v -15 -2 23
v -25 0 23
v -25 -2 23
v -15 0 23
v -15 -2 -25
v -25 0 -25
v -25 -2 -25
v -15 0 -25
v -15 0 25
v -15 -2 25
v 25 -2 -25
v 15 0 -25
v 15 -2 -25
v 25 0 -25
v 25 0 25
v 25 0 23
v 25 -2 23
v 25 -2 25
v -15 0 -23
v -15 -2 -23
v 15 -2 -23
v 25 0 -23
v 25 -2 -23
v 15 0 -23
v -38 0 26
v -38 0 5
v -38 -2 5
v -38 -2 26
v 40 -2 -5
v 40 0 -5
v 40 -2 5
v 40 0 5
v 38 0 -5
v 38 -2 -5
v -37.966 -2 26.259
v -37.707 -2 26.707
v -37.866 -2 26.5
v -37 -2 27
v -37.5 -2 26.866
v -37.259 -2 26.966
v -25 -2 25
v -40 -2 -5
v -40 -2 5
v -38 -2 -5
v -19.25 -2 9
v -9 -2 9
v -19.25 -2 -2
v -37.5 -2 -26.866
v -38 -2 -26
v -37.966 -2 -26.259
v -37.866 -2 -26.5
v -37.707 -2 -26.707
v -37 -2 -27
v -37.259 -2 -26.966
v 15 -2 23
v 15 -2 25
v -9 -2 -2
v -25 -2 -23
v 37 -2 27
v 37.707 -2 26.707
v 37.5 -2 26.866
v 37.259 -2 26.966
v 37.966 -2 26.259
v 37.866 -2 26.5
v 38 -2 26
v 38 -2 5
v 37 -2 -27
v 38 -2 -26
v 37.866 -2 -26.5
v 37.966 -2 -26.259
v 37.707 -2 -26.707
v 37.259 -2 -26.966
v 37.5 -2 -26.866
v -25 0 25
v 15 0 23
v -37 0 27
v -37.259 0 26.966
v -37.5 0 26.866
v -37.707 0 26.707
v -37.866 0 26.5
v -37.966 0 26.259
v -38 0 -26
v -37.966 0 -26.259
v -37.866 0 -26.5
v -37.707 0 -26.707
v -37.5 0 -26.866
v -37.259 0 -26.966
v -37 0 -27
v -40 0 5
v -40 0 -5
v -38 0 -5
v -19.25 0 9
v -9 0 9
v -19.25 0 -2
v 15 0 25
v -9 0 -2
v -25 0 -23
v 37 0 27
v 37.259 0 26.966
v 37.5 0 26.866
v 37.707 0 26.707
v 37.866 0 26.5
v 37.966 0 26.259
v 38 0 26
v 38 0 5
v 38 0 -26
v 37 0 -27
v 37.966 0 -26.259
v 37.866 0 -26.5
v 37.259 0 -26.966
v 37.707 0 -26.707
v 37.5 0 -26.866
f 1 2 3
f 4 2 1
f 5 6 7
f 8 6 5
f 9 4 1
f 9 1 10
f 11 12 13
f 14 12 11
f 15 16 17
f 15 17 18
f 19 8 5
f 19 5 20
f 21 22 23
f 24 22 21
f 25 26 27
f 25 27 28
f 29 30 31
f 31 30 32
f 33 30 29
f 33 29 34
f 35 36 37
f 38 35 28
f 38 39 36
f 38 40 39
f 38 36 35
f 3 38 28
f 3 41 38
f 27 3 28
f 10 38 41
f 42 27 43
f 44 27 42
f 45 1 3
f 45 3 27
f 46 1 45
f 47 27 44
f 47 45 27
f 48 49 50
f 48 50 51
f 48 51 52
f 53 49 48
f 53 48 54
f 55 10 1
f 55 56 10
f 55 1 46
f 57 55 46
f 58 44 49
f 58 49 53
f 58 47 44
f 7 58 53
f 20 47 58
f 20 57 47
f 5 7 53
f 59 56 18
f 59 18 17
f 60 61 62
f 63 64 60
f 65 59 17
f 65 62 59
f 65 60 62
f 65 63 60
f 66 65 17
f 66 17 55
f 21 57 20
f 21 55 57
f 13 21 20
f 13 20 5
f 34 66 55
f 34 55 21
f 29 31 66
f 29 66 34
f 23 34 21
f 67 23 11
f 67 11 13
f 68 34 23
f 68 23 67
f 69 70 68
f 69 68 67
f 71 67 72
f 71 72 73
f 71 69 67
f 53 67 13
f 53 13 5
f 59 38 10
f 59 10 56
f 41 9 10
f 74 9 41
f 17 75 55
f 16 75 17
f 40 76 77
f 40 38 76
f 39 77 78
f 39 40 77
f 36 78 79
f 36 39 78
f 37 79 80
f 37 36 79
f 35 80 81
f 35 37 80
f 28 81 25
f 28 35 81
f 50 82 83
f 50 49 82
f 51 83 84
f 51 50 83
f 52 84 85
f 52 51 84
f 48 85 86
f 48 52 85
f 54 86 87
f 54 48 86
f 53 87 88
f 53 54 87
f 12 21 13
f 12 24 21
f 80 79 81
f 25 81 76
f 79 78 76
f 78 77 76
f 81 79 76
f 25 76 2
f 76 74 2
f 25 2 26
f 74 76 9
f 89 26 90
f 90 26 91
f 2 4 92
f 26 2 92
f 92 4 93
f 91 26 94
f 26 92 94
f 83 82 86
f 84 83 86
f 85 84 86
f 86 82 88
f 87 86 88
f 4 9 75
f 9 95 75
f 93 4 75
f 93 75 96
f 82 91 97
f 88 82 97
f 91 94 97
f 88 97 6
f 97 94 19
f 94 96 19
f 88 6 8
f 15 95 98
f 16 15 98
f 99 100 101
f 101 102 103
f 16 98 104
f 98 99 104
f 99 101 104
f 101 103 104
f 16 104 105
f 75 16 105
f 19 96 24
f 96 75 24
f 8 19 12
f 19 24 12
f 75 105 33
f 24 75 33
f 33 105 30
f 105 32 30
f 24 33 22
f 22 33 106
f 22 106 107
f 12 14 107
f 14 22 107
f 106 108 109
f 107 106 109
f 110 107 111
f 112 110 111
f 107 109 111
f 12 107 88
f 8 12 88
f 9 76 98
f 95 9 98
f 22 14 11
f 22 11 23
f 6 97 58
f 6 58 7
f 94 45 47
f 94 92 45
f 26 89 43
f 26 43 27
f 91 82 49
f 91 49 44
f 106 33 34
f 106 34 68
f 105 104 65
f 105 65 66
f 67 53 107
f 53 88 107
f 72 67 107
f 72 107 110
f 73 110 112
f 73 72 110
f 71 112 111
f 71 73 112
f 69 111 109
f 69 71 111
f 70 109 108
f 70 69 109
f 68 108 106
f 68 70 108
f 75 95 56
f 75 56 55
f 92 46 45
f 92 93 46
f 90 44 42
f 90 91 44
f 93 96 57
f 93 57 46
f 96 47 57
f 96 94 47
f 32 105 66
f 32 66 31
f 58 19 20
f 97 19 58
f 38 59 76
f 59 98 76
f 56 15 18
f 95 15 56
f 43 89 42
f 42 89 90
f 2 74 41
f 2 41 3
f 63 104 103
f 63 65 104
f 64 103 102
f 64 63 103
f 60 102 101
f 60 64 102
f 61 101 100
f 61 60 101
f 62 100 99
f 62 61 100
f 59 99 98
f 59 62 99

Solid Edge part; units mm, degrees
sketch "Sketch1" plane through (0, 0, 0) normal (0, -1, 0) x (1, 0, 0)
  line L0 (40, -27) -> (40, 27)
  line L1 (40, 27) -> (-40, 27)
  line L2 (-40, 27) -> (-40, -27)
  line L3 (-40, -27) -> (40, -27)
extrude "Protrusion1" add sketch "Sketch1" along normal blind 2
sketch "Sketch2" plane through (0, 0, 0) normal (0, -1, 0) x (1, 0, 0)
  line L0 (-25, 23) -> (-15, 23)
  line L1 (-15, 23) -> (-15, 25)
  line L2 (-15, 25) -> (-25, 25)
  line L3 (-25, 25) -> (-25, 23)
extrude "ExtrudedCutout_1" cut sketch "Sketch2" along normal blind 2
sketch "Sketch3" plane through (0, 0, 0) normal (0, -1, 0) x (1, 0, 0)
  line L0 (25, 25) -> (15, 25)
  line L1 (15, 25) -> (15, 23)
  line L2 (15, 23) -> (25, 23)
  line L3 (25, 23) -> (25, 25)
extrude "ExtrudedCutout_2" cut sketch "Sketch3" along normal blind 2
sketch "Sketch4" plane through (0, 0, 0) normal (0, -1, 0) x (1, 0, 0)
  line L0 (15, -25) -> (25, -25)
  line L1 (25, -25) -> (25, -23)
  line L2 (25, -23) -> (15, -23)
  line L3 (15, -23) -> (15, -25)
extrude "ExtrudedCutout_3" cut sketch "Sketch4" along normal blind 2
sketch "Sketch5" plane through (0, 0, 0) normal (0, -1, 0) x (1, 0, 0)
  line L0 (-15, -23) -> (-25, -23)
  line L1 (-25, -23) -> (-25, -25)
  line L2 (-25, -25) -> (-15, -25)
  line L3 (-15, -25) -> (-15, -23)
extrude "ExtrudedCutout_4" cut sketch "Sketch5" along normal blind 2
sketch "Sketch6" plane through (0, 0, 0) normal (0, -1, 0) x (1, 0, 0)
  line L0 (-38, -27) -> (-38, -5)
  line L1 (-38, -5) -> (-40, -5)
  line L2 (-40, -5) -> (-40, -27)
  line L3 (-40, -27) -> (-38, -27)
extrude "ExtrudedCutout_5" cut sketch "Sketch6" along normal blind 2
sketch "Sketch7" plane through (0, 0, 0) normal (0, -1, 0) x (1, 0, 0)
  line L0 (-38, 5) -> (-38, 27)
  line L1 (-38, 27) -> (-40, 27)
  line L2 (-40, 27) -> (-40, 5)
  line L3 (-40, 5) -> (-38, 5)
extrude "ExtrudedCutout_6" cut sketch "Sketch7" along normal blind 2
sketch "Sketch8" plane through (0, 0, 0) normal (0, -1, 0) x (1, 0, 0)
  line L0 (38, -5) -> (38, -27)
  line L1 (38, -27) -> (40, -27)
  line L2 (40, -27) -> (40, -5)
  line L3 (40, -5) -> (38, -5)
extrude "ExtrudedCutout_7" cut sketch "Sketch8" along normal blind 2
sketch "Sketch9" plane through (0, 0, 0) normal (0, -1, 0) x (1, 0, 0)
  line L0 (38, 27) -> (38, 5)
  line L1 (38, 5) -> (40, 5)
  line L2 (40, 5) -> (40, 27)
  line L3 (40, 27) -> (38, 27)
extrude "ExtrudedCutout_8" cut sketch "Sketch9" along normal blind 2
sketch "Sketch10" plane through (0, 0, 0) normal (0, -1, 0) x (1, 0, 0)
  line L0 (-19.25, -2) -> (-9, -2)
  line L1 (-9, -2) -> (-9, 9)
  line L2 (-9, 9) -> (-19.25, 9)
  line L3 (-19.25, 9) -> (-19.25, -2)
extrude "ExtrudedCutout_9" cut sketch "Sketch10" along normal blind 2
fillet "Round_1" radius 1 4 edges at (38, -1, -27) (38, -1, 27) (-38, -1, 27) (-38, -1, -27)
properties material "Acrylic, high impact grade"
